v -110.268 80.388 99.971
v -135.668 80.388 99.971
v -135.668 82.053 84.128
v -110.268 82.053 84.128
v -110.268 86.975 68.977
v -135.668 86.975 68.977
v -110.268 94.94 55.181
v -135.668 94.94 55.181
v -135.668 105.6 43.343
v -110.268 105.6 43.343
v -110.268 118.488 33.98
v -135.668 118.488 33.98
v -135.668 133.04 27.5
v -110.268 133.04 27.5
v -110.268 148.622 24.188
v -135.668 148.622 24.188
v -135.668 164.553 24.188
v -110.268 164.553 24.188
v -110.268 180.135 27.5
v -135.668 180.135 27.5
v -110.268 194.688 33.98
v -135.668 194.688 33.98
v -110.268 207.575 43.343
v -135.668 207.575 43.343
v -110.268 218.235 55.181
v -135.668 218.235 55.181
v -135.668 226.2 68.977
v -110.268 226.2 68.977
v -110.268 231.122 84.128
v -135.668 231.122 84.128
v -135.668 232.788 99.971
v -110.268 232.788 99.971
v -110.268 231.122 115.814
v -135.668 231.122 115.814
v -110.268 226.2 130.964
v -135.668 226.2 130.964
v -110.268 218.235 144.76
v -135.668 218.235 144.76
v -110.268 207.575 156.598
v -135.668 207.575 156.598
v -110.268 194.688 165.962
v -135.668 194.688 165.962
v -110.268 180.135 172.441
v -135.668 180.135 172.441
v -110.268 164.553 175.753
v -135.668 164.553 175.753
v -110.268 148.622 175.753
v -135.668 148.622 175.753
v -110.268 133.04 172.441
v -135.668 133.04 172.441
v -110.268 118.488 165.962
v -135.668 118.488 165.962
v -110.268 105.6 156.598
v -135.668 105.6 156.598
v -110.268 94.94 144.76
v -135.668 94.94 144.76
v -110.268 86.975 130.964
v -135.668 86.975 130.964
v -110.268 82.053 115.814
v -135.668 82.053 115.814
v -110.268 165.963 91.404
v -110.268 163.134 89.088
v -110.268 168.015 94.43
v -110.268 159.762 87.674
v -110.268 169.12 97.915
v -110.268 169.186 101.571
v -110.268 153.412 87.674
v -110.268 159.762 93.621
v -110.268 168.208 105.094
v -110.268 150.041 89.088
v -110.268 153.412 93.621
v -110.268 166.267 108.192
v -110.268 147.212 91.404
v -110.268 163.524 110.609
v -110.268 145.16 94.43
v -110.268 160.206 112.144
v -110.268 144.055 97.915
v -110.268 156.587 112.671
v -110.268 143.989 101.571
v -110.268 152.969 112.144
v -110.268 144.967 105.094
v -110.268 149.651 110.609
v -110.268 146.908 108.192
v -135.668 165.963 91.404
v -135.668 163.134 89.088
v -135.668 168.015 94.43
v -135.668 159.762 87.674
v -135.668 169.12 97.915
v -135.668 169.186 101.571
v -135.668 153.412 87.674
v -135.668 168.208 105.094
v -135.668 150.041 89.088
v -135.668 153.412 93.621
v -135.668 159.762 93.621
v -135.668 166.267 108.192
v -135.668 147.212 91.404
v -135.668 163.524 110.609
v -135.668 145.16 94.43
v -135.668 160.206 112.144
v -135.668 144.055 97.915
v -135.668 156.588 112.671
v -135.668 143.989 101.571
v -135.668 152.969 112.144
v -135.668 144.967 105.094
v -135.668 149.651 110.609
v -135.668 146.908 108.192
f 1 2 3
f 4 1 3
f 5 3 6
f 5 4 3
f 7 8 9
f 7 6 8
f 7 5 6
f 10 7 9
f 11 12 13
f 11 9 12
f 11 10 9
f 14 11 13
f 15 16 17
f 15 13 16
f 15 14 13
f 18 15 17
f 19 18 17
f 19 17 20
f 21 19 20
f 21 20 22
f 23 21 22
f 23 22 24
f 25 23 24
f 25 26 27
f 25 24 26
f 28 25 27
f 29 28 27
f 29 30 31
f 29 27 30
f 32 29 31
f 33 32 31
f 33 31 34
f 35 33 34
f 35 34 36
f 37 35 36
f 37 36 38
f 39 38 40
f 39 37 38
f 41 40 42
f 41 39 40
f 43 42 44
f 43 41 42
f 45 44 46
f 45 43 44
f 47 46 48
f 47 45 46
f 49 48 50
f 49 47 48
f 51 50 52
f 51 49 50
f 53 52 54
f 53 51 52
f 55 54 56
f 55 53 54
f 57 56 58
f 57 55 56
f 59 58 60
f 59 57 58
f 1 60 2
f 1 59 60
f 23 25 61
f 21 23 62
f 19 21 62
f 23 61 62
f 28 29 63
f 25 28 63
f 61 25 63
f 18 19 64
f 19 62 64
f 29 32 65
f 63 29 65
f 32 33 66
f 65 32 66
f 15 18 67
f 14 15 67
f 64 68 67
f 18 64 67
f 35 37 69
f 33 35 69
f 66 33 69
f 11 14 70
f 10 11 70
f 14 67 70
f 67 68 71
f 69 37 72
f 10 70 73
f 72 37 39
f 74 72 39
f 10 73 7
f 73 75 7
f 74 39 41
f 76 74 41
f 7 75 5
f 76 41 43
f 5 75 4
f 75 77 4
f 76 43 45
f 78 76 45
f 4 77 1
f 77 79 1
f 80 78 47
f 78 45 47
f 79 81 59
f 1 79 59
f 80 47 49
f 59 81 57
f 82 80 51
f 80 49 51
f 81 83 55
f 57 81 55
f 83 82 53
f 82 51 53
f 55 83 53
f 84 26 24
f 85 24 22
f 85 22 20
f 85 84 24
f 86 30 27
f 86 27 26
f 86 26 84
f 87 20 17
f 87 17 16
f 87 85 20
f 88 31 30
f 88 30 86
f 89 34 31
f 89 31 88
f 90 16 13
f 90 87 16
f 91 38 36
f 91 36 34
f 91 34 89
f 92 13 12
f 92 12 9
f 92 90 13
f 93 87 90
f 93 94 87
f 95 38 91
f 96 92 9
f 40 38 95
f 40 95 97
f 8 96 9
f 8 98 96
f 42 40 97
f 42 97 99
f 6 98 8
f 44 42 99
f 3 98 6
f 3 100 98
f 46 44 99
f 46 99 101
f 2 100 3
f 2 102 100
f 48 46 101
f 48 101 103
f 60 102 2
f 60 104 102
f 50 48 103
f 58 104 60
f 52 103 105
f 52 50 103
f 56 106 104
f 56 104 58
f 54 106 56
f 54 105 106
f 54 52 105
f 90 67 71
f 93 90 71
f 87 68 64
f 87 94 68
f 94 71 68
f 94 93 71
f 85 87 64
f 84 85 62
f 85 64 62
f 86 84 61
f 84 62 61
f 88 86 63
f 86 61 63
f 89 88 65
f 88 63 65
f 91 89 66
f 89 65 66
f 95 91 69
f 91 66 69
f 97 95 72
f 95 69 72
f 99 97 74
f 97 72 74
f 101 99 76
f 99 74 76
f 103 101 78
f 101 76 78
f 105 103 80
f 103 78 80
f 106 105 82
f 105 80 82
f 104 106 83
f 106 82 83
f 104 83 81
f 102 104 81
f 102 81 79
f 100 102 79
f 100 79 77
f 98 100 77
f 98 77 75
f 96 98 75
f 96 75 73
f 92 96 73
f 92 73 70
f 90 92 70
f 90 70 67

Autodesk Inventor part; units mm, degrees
ref_plane "YZ Plane" through (0, 0, 0) normal (1, 0, 0) x (0, 1, 0)
ref_plane "XZ Plane" through (0, 0, 0) normal (0, 1, 0) x (-1, 0, 0)
ref_plane "Work Plane1" through (-110.2685, -72.0125, 201.5707) normal (-1, 0, 0) x (0, -1, 0)
sketch "Sketch1" plane through (-110.2685, -72.0125, 201.5707) normal (-1, 0, 0) x (0, -1, 0)
  circle A0 centre (-228.6, -101.6) radius 12.7 projected
  circle A1 centre (-228.6, -101.6) radius 76.2
  circle A2 centre (-228.6, -101.6) radius 12.7
  point P0 (-72.0125, -201.5707)
  dimension "d0" = 152.4
extrude "Extrusion1" add sketch "Sketch1" along normal blind 25.4
sketch "Sketch4" plane through (-135.6685, 156.5875, 99.9707) normal (-1, 0, 0) x (0, 0, 1)
  circle A0 centre (0, 0) radius 12.7 construction
  line L0 (-12.7, 0) -> (12.7, 0) construction
  line L1 (-6.35, -3.175) -> (-6.35, 3.175)
  line L2 (-6.35, 3.175) -> (-19.05, 3.175)
  line L3 (-19.05, 3.175) -> (-19.05, -3.175)
  line L4 (-19.05, -3.175) -> (-6.35, -3.175)
  line L5 (-6.35, -3.175) -> (-19.05, 3.175) construction
  line L6 (-6.35, 3.175) -> (-19.05, -3.175) construction
  dimension "d7" = 6.35
  dimension "d8" = 12.7
extrude "Extrusion3" add sketch "Sketch4" against normal blind 25.4
properties part number "clutch02-simplyGearDisk" material "PET Plastic"
